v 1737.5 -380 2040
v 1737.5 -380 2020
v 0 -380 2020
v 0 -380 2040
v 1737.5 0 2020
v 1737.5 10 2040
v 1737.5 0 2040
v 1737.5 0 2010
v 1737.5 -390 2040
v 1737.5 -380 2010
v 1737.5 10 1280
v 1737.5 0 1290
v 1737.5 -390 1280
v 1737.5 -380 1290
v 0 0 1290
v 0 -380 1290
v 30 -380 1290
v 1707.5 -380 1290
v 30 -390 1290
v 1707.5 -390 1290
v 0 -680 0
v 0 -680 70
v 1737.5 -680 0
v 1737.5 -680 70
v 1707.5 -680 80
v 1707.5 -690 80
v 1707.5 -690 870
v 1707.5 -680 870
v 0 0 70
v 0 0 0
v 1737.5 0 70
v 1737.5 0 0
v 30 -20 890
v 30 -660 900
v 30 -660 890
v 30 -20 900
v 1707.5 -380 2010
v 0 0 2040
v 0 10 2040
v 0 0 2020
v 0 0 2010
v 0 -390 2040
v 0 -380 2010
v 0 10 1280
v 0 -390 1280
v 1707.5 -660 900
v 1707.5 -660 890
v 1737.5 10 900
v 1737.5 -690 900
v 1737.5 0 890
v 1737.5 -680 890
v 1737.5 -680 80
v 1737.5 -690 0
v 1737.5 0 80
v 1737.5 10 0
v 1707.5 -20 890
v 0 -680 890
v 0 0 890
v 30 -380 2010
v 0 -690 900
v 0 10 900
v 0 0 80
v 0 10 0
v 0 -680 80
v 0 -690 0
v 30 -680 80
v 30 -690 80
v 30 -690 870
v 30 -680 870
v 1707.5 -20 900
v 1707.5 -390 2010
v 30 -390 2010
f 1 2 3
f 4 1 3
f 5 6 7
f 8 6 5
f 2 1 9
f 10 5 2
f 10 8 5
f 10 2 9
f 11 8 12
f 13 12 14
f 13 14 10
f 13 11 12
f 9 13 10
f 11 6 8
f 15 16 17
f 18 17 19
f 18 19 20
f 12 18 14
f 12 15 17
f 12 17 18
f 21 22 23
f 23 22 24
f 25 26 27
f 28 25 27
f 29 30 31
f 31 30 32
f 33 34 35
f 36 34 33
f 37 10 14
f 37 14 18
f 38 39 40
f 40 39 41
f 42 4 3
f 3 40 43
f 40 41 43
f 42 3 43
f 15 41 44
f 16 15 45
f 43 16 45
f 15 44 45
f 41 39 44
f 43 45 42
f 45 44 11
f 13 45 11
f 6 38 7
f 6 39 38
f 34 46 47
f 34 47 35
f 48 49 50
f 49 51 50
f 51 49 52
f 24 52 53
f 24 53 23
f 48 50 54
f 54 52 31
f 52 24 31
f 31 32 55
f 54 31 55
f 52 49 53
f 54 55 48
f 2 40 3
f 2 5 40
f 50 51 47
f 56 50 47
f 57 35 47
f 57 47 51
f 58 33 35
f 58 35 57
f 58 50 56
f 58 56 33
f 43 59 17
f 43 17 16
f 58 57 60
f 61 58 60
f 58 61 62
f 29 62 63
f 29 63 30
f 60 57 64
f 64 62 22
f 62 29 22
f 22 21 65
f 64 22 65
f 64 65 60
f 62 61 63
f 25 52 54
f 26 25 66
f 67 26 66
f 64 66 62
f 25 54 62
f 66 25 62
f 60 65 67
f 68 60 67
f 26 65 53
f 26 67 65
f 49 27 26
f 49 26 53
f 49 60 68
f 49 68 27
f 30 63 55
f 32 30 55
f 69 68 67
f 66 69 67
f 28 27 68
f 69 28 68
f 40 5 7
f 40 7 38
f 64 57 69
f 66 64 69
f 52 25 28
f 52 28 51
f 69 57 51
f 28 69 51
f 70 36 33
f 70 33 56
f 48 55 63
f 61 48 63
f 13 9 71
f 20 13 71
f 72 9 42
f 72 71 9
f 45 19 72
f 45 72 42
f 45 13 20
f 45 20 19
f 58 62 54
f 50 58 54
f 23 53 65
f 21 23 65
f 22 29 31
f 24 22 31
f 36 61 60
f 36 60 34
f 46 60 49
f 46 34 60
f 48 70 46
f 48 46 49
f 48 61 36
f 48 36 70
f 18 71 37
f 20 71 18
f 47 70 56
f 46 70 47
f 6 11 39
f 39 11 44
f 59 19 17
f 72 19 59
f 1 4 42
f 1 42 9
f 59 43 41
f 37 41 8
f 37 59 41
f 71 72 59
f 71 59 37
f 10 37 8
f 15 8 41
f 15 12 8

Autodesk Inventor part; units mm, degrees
ref_plane "YZ Plane" through (0, 0, 0) normal (1, 0, 0) x (0, 1, 0)
ref_plane "XZ Plane" through (0, 0, 0) normal (0, 1, 0) x (-1, 0, 0)
sketch "Sketch1" plane through (0, 0, 0) normal (0, 0, 1) x (1, 0, 0)
  line L0 (0, 0) -> (1737.5, 0)
  line L1 (1737.5, 0) -> (1737.5, 10)
  line L2 (1737.5, 10) -> (0, 10)
  line L3 (0, 10) -> (0, 0)
  dimension "ancho" = 1737.5
  dimension "espesor" = 10
extrude "Extrusion1" add sketch "Sketch1" along normal blind 900
sketch "Sketch2" plane through (0, 0, 0) normal (0, -1, 0) x (1, 0, 0)
  line L0 (0, 0) -> (1737.5, 0) construction
  line L1 (1737.5, 0) -> (1737.5, 900) construction
  line L2 (0, 900) -> (1737.5, 900) construction
  line L3 (0, 0) -> (0, 900) construction
  line L4 (0, 0) -> (0, 900) projected
  line L5 (0, 70) -> (1737.5, 70)
  line L6 (1737.5, 70) -> (1737.5, 80)
  line L7 (1737.5, 80) -> (0, 80)
  line L8 (0, 80) -> (0, 70)
  line L9 (0, 900) -> (1737.5, 900) projected
  line L10 (1737.5, 0) -> (1737.5, 900) projected
  line L11 (0, 900) -> (1737.5, 900)
  line L12 (1737.5, 900) -> (1737.5, 890)
  line L13 (1737.5, 890) -> (0, 890)
  line L14 (0, 890) -> (0, 900)
  dimension "d5" = 10
  dimension "d6" = 10
  dimension "d7" = 80
extrude "Extrusion2" add sketch "Sketch2" along normal blind 690 contours L4 L7 L6 L5 | L4 L9 L10 L13
sketch "Sketch3" plane through (0, 0, 900) normal (0, 0, 1) x (1, 0, 0)
  line L0 (1737.5, 10) -> (1737.5, -690) projected
  line L1 (1737.5, 10) -> (0, 10) projected
  line L2 (0, 10) -> (0, -690) projected
  line L3 (1737.5, -690) -> (0, -690) projected
  line L4 (30, -660) -> (30, -20)
  line L5 (30, -20) -> (1707.5, -20)
  line L6 (1707.5, -20) -> (1707.5, -660)
  line L7 (1707.5, -660) -> (30, -660)
  point P0 (0, 0)
  dimension "d10" = 30
extrude "Extrusion3" cut sketch "Sketch3" against normal up to next contours L4 L5 L6 L7
sketch "Sketch4" plane through (0, -690, 0) normal (0, -1, 0) x (1, 0, 0)
  line L0 (0, 70) -> (1737.5, 70) construction
  line L1 (1737.5, 70) -> (1737.5, 80) construction
  line L2 (1737.5, 80) -> (0, 80) construction
  line L3 (0, 80) -> (0, 70) construction
  line L4 (0, 900) -> (0, 890) construction
  line L5 (0, 890) -> (1737.5, 890) construction
  line L6 (1737.5, 890) -> (1737.5, 900) construction
  line L7 (1737.5, 900) -> (0, 900) construction
  line L8 (1737.5, 70) -> (0, 70) construction
  line L9 (0, 0) -> (0, 70) construction
  line L10 (0, 0) -> (1737.5, 0) construction
  line L11 (1737.5, 0) -> (1737.5, 70) construction
  line L12 (0, 900) -> (1737.5, 900)
  line L13 (1737.5, 900) -> (1737.5, 0)
  line L14 (1737.5, 0) -> (0, 0)
  line L15 (0, 0) -> (0, 900)
  line L16 (1737.5, 80) -> (0, 80) projected
  line L17 (30, 80) -> (1707.5, 80)
  line L18 (1707.5, 80) -> (1707.5, 890)
  line L19 (1707.5, 890) -> (30, 890)
  line L20 (30, 890) -> (30, 80)
  dimension "d13" = 30
  dimension "d14" = 30
extrude "Extrusion4" add sketch "Sketch4" against normal blind 10 contours L12 L13 L16 L18 L19 L20 L15 | L16 L13 L14 L15
ref_plane "Work Plane1" through (0, 0, 1280) normal (0, 0, 1) x (1, 0, 0)
sketch "Sketch5" plane through (0, 0, 1280) normal (0, 0, 1) x (1, 0, 0)
  line L0 (1737.5, 10) -> (0, 10) projected
  line L1 (0, 10) -> (0, -690) projected
  line L2 (1737.5, 10) -> (1737.5, -690) projected
  line L3 (1737.5, -690) -> (0, -690) projected
  line L4 (0, 10) -> (1737.5, 10)
  line L5 (1737.5, 10) -> (1737.5, -390)
  line L6 (1737.5, -390) -> (0, -390)
  line L7 (0, -390) -> (0, 10)
  line L8 (1707.5, -660) -> (1707.5, -20) projected
  line L9 (0, -390) -> (1707.5, -390)
  line L10 (1707.5, -390) -> (1707.5, -380)
  line L11 (1707.5, -380) -> (0, -380)
  line L12 (0, -380) -> (0, -390)
  point P0 (0, 0)
  dimension "d36" = 1737.5
  dimension "profundidad2" = 400
  dimension "d39" = 10
extrude "Extrusion5" add sketch "Sketch5" along normal blind 10 contours L2 L6 L8 L11 L1 L0 | L11 L8 L6 L1
sketch "Sketch9" plane through (0, -690, 0) normal (0, -1, 0) x (1, 0, 0)
  line L0 (30, 890) -> (1707.5, 890) construction
  line L1 (1707.5, 80) -> (30, 80) construction
  line L2 (0, 900) -> (0, 0) construction
  line L3 (1737.5, 0) -> (0, 0) construction
  line L4 (1737.5, 900) -> (1737.5, 0) construction
  line L5 (1737.5, 900) -> (0, 900) construction
  line L6 (1737.5, 70) -> (1737.5, 0) projected
  line L7 (0, 900) -> (1737.5, 900)
  line L8 (1737.5, 900) -> (1737.5, 870)
  line L9 (1737.5, 870) -> (0, 870)
  line L10 (0, 870) -> (0, 900)
  line L11 (1707.5, 890) -> (1707.5, 80) projected
  line L12 (30, 80) -> (30, 890) projected
  point P0 (1737.5, 890)
  point P1 (1737.5, 80)
  dimension "d32" = 30
extrude "Extrusion9" add sketch "Sketch9" against normal blind 10
sketch "Boceto10" plane through (0, 0, 1290) normal (0, 0, 1) x (1, 0, 0)
  line L0 (0, 10) -> (0, -390) projected
  line L1 (0, -390) -> (1737.5, -390) projected
  line L2 (1737.5, -390) -> (1737.5, 10) projected
  line L3 (1737.5, 10) -> (0, 10) projected
  line L4 (1737.5, 10) -> (1737.5, -690) projected
  line L5 (0, -390) -> (1737.5, -390)
  line L6 (1737.5, -390) -> (1737.5, -380)
  line L7 (1737.5, -380) -> (0, -380)
  line L8 (0, -380) -> (0, -390)
  line L9 (0, 10) -> (1737.5, 10)
  line L10 (1737.5, 10) -> (1737.5, 0)
  line L11 (1737.5, 0) -> (0, 0)
  line L12 (0, 0) -> (0, 10)
  point P0 (0, 0)
  dimension "d40" = 10
  dimension "d41" = 10
extrude "Extrusión10" add sketch "Boceto10" along normal blind 750 contours L3 L2 L11 L0 | L7 L2 L1 L0
sketch "Boceto11" plane through (0, -390, 1280) normal (0, -1, 0) x (1, 0, 0)
  line L0 (0, 760) -> (1737.5, 760) projected
  line L1 (1737.5, 0) -> (1737.5, 760) projected
  line L2 (0, 760) -> (1737.5, 760) projected
  line L3 (0, 0) -> (0, 760) projected
  line L4 (30, 730) -> (1707.5, 730)
  line L5 (1707.5, 730) -> (1707.5, 10)
  line L6 (1707.5, 10) -> (30, 10)
  line L7 (30, 10) -> (30, 730)
  line L8 (0, 0) -> (1737.5, 0) projected
  point P0 (0, -1280)
  dimension "d44" = 30
  dimension "d45" = 30
  dimension "d46" = 30
extrude "Extrusión11" cut sketch "Boceto11" against normal up to next contours L4 L5 L6 L7
sketch "Sketch13" plane through (1737.5, -390, 1280) normal (1, 0, 0) x (0, 0, -1)
  line L0 (0, 0) -> (0, 400) construction
  line L1 (0, 400) -> (-760, 400) construction
  line L2 (-10, 390) -> (-760, 390) construction
  line L3 (-10, 10) -> (-760, 10) construction
  line L4 (-760, 0) -> (-760, 10) construction
  line L5 (0, 0) -> (-760, 0) construction
  line L6 (1280, 400) -> (-760, 400) projected
  line L7 (-740, 0) -> (-730, 0)
  line L8 (-730, 0) -> (-730, 400)
  line L9 (-730, 400) -> (-740, 400)
  line L10 (-740, 400) -> (-740, 0)
  line L11 (-760, 390) -> (-760, 400) projected
  line L12 (-10, 10) -> (-10, 390) projected
  point P0 (1280, 390)
  point P1 (1030, 400)
  dimension "d53" = 10
  dimension "d54" = 20
extrude "Extrusion13" add sketch "Sketch13" against normal blind 1737.5
equation "\"d5\" = espesor"
equation "\"d6\" = espesor"
equation "\"d10\" = 3 * espesor"
equation "\"d13\" = 3 * espesor"
equation "\"d14\" = 3 * espesor"
equation "\"d15\" = espesor"
equation "\"d36\" = ancho"
equation "\"d39\" = espesor"
equation "\"d18\" = espesor"
equation "\"d32\" = 3 * espesor"
equation "\"d33\" = espesor"
equation "\"d40\" = espesor"
equation "\"d41\" = espesor"
equation "\"d44\" = 3 * espesor"
equation "\"d45\" = 3 * espesor"
equation "\"d46\" = 3 * espesor"
equation "\"d53\" = espesor"
equation "\"d54\" = 2 * espesor"
equation "\"d55\" = ancho"
properties part number "esqueleto_mueble"
